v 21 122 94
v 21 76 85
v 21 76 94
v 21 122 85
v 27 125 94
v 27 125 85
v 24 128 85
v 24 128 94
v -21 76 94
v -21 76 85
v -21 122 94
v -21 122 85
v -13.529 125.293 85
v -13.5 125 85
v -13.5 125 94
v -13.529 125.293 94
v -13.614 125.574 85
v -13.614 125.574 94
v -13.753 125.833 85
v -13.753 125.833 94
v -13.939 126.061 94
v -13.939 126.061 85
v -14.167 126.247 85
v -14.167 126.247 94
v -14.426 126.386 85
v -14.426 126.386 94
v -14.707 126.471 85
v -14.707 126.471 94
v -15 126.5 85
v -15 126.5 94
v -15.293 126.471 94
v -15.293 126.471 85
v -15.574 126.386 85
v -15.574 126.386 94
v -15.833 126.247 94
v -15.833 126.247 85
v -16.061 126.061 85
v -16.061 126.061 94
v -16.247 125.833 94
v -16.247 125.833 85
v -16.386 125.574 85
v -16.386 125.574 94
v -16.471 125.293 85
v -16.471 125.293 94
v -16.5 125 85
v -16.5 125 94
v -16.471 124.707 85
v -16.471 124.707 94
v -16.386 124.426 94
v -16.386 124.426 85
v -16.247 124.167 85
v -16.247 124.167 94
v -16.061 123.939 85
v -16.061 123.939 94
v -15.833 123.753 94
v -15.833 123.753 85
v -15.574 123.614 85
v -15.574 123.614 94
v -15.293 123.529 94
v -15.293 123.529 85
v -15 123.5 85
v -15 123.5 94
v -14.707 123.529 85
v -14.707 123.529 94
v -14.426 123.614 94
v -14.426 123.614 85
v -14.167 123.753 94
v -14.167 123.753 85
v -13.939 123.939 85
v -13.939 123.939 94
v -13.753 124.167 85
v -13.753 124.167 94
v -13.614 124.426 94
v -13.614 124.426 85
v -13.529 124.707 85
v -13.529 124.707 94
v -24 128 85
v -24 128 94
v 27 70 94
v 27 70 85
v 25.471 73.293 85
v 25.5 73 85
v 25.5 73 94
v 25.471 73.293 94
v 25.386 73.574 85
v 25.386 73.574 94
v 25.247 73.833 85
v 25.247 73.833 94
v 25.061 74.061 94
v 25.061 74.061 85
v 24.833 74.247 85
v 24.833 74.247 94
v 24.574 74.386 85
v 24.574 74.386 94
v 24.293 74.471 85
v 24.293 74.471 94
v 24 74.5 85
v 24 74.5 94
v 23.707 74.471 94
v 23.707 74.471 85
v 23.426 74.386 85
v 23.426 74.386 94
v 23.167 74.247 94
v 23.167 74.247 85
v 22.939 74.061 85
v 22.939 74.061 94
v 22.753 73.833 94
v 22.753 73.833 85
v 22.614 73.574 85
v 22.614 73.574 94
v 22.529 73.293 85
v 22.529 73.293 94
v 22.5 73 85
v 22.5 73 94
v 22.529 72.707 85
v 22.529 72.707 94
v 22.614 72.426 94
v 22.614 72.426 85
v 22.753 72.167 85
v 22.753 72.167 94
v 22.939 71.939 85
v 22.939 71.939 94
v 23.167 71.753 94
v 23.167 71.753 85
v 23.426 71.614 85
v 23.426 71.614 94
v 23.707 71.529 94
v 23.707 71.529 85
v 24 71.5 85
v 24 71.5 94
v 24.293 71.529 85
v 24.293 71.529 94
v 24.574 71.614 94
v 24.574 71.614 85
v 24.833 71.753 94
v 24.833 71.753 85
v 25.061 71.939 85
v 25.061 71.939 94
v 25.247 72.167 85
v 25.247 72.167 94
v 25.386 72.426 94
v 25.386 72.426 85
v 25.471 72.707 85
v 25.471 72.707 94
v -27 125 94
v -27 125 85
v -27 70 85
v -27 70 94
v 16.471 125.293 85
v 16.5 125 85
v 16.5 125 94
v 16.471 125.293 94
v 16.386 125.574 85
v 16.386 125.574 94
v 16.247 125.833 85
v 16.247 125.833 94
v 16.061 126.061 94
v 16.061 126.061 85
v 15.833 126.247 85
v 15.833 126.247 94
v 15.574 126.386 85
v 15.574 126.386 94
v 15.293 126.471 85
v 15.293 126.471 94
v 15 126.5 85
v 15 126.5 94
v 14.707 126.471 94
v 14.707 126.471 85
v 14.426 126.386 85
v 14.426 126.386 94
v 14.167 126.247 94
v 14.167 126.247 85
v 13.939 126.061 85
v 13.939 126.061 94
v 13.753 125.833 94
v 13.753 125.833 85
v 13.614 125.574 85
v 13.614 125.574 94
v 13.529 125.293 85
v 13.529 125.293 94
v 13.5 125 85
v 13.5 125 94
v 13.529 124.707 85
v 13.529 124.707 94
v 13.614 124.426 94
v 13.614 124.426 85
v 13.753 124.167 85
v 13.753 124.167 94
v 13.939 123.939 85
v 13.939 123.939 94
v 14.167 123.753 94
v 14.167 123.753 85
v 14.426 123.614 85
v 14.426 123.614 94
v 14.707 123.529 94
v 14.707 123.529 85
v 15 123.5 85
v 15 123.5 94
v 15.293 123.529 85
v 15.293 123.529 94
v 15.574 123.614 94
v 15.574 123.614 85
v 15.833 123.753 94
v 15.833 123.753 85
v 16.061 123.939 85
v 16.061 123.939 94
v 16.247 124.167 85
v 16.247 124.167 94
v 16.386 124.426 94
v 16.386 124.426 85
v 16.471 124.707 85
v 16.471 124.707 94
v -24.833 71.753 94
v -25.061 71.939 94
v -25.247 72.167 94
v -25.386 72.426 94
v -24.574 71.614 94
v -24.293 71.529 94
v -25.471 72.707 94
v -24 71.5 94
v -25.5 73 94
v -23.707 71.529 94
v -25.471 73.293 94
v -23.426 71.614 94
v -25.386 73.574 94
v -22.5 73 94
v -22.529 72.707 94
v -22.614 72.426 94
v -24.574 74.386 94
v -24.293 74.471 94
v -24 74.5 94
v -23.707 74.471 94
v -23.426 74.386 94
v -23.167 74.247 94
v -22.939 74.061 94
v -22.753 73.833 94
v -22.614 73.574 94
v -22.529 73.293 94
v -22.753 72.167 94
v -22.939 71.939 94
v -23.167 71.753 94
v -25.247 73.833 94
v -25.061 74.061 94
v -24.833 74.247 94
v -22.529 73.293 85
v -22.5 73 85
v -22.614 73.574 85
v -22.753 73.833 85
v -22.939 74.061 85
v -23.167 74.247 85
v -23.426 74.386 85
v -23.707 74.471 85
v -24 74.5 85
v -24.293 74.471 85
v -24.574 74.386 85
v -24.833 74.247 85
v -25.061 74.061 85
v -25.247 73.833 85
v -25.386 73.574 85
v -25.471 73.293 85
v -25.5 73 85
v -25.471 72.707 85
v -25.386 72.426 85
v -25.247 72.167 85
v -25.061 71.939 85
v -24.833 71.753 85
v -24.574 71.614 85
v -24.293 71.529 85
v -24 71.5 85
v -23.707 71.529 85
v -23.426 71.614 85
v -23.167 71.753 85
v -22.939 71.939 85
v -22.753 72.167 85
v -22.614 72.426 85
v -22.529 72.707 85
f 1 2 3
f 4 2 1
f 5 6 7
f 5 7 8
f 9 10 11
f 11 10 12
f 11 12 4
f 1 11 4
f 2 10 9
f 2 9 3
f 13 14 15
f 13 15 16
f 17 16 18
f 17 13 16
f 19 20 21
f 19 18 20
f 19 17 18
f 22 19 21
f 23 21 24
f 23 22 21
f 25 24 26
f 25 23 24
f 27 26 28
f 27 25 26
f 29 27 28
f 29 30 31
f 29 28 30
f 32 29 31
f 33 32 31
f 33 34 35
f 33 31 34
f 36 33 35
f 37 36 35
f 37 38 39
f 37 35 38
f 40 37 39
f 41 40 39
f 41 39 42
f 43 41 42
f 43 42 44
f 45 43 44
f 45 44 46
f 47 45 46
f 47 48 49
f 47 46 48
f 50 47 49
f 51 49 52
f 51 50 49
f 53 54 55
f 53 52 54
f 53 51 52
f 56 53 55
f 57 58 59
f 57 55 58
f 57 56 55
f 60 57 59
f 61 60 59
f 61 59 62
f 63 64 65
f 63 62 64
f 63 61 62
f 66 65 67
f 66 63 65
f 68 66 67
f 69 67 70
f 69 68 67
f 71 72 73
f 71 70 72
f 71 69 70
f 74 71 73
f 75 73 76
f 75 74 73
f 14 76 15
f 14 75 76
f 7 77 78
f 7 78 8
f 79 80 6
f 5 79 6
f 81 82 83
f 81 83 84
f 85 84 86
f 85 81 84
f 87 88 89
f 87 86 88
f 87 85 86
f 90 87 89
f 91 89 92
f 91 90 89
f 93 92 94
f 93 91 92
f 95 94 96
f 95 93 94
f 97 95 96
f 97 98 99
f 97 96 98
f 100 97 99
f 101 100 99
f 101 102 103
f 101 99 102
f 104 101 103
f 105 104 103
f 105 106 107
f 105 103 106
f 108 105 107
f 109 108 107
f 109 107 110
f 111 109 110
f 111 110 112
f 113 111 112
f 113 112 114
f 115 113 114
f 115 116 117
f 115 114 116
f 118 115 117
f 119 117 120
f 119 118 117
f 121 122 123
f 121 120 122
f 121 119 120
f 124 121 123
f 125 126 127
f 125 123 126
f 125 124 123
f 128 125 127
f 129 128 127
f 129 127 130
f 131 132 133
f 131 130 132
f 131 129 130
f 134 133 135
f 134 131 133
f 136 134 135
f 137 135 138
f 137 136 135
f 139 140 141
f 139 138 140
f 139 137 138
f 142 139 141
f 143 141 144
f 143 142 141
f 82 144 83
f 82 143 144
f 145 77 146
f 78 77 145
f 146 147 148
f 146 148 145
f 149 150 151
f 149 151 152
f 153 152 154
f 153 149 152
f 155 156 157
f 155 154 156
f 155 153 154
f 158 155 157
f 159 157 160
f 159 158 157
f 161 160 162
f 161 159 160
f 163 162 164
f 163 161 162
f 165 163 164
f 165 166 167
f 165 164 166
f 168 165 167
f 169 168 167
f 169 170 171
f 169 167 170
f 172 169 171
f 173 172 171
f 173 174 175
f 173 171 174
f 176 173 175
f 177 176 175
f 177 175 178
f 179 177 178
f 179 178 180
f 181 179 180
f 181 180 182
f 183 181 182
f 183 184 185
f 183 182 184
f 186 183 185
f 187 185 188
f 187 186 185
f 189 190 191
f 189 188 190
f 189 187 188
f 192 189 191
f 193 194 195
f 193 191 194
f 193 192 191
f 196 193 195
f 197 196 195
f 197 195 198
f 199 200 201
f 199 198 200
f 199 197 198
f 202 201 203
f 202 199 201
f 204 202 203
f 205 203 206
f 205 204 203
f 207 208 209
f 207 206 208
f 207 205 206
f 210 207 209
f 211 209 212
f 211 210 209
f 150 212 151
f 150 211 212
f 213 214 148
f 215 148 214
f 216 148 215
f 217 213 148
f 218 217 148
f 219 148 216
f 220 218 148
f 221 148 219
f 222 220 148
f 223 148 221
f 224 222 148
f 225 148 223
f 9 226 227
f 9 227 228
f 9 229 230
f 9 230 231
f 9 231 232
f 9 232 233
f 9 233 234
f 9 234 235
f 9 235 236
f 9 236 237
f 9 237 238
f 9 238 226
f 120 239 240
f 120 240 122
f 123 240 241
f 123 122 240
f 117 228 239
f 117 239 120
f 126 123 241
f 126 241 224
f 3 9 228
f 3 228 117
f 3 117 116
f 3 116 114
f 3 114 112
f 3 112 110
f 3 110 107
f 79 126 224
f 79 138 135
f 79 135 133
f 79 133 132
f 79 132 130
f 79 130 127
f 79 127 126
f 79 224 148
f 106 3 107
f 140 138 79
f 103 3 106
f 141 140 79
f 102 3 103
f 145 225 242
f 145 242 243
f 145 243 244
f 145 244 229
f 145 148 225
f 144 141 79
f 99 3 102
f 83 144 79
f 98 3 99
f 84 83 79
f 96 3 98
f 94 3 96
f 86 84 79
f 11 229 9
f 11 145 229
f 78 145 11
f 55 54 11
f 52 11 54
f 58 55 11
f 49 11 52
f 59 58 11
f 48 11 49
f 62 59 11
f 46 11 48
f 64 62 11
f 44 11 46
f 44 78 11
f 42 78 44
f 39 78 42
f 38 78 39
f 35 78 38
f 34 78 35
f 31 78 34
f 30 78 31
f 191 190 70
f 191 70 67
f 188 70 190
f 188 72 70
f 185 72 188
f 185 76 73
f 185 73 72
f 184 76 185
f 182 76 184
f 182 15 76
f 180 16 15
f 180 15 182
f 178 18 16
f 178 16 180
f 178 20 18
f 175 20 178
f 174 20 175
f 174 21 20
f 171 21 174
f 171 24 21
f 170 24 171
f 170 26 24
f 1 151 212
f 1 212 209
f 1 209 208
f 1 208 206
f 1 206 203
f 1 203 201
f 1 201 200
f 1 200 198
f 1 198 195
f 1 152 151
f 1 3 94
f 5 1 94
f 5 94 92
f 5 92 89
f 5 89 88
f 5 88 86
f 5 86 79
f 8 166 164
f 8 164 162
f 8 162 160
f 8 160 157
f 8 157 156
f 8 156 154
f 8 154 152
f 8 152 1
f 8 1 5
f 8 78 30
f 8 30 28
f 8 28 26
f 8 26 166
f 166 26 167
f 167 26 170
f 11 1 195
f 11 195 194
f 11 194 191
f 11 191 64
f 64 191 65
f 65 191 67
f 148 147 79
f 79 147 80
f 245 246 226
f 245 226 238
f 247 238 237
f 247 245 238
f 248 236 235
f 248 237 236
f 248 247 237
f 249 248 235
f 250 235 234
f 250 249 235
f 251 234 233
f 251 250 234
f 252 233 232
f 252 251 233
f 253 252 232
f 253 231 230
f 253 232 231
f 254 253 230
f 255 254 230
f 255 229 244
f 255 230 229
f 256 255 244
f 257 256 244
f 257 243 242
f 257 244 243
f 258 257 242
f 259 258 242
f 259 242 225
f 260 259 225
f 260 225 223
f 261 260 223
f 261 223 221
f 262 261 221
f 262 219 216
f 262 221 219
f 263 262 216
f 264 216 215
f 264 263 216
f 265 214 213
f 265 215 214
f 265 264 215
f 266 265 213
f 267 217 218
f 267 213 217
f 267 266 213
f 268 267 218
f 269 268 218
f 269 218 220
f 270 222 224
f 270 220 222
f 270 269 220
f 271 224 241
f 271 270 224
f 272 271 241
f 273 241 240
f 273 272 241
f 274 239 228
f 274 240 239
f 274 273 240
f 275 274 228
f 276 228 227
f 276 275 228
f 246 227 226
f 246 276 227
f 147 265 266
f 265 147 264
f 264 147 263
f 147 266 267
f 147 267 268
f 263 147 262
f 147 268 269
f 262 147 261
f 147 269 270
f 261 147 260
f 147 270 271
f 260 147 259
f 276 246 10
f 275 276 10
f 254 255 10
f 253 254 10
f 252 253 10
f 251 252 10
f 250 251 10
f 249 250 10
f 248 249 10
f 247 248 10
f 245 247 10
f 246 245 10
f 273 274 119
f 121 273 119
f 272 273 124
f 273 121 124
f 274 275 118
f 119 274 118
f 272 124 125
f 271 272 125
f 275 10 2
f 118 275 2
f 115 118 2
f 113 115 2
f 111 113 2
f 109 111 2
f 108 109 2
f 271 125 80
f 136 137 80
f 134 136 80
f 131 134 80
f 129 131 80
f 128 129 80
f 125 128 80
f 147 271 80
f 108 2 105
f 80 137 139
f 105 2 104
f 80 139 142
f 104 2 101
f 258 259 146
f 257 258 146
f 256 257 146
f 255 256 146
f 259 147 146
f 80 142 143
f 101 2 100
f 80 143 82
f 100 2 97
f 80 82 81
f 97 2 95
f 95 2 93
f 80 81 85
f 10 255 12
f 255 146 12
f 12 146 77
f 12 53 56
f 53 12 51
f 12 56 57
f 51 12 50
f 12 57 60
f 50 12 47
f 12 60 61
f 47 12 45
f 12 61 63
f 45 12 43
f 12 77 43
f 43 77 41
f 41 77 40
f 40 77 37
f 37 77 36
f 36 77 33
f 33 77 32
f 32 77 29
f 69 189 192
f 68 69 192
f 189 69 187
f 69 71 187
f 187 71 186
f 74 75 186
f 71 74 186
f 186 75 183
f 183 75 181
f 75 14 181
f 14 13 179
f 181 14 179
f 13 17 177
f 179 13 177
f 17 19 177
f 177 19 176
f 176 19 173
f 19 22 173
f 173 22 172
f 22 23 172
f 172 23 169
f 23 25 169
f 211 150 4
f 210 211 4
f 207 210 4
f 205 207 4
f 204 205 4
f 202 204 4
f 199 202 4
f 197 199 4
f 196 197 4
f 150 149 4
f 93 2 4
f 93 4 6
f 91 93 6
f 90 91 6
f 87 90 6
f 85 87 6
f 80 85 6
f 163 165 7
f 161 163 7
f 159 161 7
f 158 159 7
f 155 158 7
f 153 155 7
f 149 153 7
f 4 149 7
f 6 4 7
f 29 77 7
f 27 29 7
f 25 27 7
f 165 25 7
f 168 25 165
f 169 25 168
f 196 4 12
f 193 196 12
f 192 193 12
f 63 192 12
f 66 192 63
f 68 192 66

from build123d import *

# Parameters (mm, degrees)
CYLINDER2800_R     = 1.5
CYLINDER2800_DEPTH = 60
CYLINDER2801_R     = 1.5
CYLINDER2801_DEPTH = 60
CYLINDER2802_R     = 1.5
CYLINDER2802_DEPTH = 60
CYLINDER2799_R     = 1.5
CYLINDER2799_DEPTH = 60
BOX1001_W          = 42
BOX1001_H          = 46
BOX1001_DEPTH      = 50
BOX1000_W          = 54
BOX1000_H          = 58
BOX1000_DEPTH      = 9
CHAMFER146_SIZE    = 3


with BuildPart() as v_lec2770:
    # Cylinder2800 → Cylinder2800 (new body)
    with BuildSketch(Plane(origin=(-24, 73, -80), x_dir=(1, 0, 0), z_dir=(0, 0, 1))):
        Circle(CYLINDER2800_R)
    extrude(amount=CYLINDER2800_DEPTH)


with BuildPart() as v_lec2771:
    # Cylinder2801 → Cylinder2801 (new body)
    with BuildSketch(Plane(origin=(-15, 125, -80), x_dir=(1, 0, 0), z_dir=(0, 0, 1))):
        Circle(CYLINDER2801_R)
    extrude(amount=CYLINDER2801_DEPTH)


with BuildPart() as v_lec2772:
    # Cylinder2802 → Cylinder2802 (new body)
    with BuildSketch(Plane(origin=(15, 125, -80), x_dir=(1, 0, 0), z_dir=(0, 0, 1))):
        Circle(CYLINDER2802_R)
    extrude(amount=CYLINDER2802_DEPTH)


with BuildPart() as compound1251:
    # Cylinder2799 → Cylinder2799 (new body)
    with BuildSketch(Plane(origin=(24, 73, -80), x_dir=(1, 0, 0), z_dir=(0, 0, 1))):
        Circle(CYLINDER2799_R)
    extrude(amount=CYLINDER2799_DEPTH)

    # Compound1251: union Válec2770, Válec2771, Válec2772
    add(v_lec2770.part)
    add(v_lec2771.part)
    add(v_lec2772.part)


with BuildPart() as compound1251_1:
    # Compound1251 placement: moved
    add(compound1251.part.moved(Location((0, 0, 120))))


with BuildPart() as krychle1000:
    # Box1001 → Box1001 (new body)
    with BuildSketch(Plane(origin=(-21, 76, 38), x_dir=(1, 0, 0), z_dir=(0, 0, 1))):
        with Locations((21, 23)):
            Rectangle(BOX1001_W, BOX1001_H)
    extrude(amount=BOX1001_DEPTH)


with BuildPart() as cut1063:
    # Box1000 → Box1000 (new body)
    with BuildSketch(Plane(origin=(-27, 70, 75), x_dir=(1, 0, 0), z_dir=(0, 0, 1))):
        with Locations((27, 29)):
            Rectangle(BOX1000_W, BOX1000_H)
    extrude(amount=BOX1000_DEPTH)

    # Cut1068: cut Krychle1000
    add(krychle1000.part, mode=Mode.SUBTRACT)


with BuildPart() as cut1063_1:
    # Cut1068 placement: moved
    add(cut1063.part.moved(Location((0, 0, 10))))

    # Chamfer146
    chamfer146_edges = [cut1063_1.edges().sort_by_distance(p)[0] for p in [
        (-27, 128, 89.5),
        (27, 128, 89.5),
    ]]
    chamfer(chamfer146_edges, length=CHAMFER146_SIZE)

    # Cut1063: cut Compound1251
    add(compound1251_1.part, mode=Mode.SUBTRACT)


solid = cut1063_1.part
